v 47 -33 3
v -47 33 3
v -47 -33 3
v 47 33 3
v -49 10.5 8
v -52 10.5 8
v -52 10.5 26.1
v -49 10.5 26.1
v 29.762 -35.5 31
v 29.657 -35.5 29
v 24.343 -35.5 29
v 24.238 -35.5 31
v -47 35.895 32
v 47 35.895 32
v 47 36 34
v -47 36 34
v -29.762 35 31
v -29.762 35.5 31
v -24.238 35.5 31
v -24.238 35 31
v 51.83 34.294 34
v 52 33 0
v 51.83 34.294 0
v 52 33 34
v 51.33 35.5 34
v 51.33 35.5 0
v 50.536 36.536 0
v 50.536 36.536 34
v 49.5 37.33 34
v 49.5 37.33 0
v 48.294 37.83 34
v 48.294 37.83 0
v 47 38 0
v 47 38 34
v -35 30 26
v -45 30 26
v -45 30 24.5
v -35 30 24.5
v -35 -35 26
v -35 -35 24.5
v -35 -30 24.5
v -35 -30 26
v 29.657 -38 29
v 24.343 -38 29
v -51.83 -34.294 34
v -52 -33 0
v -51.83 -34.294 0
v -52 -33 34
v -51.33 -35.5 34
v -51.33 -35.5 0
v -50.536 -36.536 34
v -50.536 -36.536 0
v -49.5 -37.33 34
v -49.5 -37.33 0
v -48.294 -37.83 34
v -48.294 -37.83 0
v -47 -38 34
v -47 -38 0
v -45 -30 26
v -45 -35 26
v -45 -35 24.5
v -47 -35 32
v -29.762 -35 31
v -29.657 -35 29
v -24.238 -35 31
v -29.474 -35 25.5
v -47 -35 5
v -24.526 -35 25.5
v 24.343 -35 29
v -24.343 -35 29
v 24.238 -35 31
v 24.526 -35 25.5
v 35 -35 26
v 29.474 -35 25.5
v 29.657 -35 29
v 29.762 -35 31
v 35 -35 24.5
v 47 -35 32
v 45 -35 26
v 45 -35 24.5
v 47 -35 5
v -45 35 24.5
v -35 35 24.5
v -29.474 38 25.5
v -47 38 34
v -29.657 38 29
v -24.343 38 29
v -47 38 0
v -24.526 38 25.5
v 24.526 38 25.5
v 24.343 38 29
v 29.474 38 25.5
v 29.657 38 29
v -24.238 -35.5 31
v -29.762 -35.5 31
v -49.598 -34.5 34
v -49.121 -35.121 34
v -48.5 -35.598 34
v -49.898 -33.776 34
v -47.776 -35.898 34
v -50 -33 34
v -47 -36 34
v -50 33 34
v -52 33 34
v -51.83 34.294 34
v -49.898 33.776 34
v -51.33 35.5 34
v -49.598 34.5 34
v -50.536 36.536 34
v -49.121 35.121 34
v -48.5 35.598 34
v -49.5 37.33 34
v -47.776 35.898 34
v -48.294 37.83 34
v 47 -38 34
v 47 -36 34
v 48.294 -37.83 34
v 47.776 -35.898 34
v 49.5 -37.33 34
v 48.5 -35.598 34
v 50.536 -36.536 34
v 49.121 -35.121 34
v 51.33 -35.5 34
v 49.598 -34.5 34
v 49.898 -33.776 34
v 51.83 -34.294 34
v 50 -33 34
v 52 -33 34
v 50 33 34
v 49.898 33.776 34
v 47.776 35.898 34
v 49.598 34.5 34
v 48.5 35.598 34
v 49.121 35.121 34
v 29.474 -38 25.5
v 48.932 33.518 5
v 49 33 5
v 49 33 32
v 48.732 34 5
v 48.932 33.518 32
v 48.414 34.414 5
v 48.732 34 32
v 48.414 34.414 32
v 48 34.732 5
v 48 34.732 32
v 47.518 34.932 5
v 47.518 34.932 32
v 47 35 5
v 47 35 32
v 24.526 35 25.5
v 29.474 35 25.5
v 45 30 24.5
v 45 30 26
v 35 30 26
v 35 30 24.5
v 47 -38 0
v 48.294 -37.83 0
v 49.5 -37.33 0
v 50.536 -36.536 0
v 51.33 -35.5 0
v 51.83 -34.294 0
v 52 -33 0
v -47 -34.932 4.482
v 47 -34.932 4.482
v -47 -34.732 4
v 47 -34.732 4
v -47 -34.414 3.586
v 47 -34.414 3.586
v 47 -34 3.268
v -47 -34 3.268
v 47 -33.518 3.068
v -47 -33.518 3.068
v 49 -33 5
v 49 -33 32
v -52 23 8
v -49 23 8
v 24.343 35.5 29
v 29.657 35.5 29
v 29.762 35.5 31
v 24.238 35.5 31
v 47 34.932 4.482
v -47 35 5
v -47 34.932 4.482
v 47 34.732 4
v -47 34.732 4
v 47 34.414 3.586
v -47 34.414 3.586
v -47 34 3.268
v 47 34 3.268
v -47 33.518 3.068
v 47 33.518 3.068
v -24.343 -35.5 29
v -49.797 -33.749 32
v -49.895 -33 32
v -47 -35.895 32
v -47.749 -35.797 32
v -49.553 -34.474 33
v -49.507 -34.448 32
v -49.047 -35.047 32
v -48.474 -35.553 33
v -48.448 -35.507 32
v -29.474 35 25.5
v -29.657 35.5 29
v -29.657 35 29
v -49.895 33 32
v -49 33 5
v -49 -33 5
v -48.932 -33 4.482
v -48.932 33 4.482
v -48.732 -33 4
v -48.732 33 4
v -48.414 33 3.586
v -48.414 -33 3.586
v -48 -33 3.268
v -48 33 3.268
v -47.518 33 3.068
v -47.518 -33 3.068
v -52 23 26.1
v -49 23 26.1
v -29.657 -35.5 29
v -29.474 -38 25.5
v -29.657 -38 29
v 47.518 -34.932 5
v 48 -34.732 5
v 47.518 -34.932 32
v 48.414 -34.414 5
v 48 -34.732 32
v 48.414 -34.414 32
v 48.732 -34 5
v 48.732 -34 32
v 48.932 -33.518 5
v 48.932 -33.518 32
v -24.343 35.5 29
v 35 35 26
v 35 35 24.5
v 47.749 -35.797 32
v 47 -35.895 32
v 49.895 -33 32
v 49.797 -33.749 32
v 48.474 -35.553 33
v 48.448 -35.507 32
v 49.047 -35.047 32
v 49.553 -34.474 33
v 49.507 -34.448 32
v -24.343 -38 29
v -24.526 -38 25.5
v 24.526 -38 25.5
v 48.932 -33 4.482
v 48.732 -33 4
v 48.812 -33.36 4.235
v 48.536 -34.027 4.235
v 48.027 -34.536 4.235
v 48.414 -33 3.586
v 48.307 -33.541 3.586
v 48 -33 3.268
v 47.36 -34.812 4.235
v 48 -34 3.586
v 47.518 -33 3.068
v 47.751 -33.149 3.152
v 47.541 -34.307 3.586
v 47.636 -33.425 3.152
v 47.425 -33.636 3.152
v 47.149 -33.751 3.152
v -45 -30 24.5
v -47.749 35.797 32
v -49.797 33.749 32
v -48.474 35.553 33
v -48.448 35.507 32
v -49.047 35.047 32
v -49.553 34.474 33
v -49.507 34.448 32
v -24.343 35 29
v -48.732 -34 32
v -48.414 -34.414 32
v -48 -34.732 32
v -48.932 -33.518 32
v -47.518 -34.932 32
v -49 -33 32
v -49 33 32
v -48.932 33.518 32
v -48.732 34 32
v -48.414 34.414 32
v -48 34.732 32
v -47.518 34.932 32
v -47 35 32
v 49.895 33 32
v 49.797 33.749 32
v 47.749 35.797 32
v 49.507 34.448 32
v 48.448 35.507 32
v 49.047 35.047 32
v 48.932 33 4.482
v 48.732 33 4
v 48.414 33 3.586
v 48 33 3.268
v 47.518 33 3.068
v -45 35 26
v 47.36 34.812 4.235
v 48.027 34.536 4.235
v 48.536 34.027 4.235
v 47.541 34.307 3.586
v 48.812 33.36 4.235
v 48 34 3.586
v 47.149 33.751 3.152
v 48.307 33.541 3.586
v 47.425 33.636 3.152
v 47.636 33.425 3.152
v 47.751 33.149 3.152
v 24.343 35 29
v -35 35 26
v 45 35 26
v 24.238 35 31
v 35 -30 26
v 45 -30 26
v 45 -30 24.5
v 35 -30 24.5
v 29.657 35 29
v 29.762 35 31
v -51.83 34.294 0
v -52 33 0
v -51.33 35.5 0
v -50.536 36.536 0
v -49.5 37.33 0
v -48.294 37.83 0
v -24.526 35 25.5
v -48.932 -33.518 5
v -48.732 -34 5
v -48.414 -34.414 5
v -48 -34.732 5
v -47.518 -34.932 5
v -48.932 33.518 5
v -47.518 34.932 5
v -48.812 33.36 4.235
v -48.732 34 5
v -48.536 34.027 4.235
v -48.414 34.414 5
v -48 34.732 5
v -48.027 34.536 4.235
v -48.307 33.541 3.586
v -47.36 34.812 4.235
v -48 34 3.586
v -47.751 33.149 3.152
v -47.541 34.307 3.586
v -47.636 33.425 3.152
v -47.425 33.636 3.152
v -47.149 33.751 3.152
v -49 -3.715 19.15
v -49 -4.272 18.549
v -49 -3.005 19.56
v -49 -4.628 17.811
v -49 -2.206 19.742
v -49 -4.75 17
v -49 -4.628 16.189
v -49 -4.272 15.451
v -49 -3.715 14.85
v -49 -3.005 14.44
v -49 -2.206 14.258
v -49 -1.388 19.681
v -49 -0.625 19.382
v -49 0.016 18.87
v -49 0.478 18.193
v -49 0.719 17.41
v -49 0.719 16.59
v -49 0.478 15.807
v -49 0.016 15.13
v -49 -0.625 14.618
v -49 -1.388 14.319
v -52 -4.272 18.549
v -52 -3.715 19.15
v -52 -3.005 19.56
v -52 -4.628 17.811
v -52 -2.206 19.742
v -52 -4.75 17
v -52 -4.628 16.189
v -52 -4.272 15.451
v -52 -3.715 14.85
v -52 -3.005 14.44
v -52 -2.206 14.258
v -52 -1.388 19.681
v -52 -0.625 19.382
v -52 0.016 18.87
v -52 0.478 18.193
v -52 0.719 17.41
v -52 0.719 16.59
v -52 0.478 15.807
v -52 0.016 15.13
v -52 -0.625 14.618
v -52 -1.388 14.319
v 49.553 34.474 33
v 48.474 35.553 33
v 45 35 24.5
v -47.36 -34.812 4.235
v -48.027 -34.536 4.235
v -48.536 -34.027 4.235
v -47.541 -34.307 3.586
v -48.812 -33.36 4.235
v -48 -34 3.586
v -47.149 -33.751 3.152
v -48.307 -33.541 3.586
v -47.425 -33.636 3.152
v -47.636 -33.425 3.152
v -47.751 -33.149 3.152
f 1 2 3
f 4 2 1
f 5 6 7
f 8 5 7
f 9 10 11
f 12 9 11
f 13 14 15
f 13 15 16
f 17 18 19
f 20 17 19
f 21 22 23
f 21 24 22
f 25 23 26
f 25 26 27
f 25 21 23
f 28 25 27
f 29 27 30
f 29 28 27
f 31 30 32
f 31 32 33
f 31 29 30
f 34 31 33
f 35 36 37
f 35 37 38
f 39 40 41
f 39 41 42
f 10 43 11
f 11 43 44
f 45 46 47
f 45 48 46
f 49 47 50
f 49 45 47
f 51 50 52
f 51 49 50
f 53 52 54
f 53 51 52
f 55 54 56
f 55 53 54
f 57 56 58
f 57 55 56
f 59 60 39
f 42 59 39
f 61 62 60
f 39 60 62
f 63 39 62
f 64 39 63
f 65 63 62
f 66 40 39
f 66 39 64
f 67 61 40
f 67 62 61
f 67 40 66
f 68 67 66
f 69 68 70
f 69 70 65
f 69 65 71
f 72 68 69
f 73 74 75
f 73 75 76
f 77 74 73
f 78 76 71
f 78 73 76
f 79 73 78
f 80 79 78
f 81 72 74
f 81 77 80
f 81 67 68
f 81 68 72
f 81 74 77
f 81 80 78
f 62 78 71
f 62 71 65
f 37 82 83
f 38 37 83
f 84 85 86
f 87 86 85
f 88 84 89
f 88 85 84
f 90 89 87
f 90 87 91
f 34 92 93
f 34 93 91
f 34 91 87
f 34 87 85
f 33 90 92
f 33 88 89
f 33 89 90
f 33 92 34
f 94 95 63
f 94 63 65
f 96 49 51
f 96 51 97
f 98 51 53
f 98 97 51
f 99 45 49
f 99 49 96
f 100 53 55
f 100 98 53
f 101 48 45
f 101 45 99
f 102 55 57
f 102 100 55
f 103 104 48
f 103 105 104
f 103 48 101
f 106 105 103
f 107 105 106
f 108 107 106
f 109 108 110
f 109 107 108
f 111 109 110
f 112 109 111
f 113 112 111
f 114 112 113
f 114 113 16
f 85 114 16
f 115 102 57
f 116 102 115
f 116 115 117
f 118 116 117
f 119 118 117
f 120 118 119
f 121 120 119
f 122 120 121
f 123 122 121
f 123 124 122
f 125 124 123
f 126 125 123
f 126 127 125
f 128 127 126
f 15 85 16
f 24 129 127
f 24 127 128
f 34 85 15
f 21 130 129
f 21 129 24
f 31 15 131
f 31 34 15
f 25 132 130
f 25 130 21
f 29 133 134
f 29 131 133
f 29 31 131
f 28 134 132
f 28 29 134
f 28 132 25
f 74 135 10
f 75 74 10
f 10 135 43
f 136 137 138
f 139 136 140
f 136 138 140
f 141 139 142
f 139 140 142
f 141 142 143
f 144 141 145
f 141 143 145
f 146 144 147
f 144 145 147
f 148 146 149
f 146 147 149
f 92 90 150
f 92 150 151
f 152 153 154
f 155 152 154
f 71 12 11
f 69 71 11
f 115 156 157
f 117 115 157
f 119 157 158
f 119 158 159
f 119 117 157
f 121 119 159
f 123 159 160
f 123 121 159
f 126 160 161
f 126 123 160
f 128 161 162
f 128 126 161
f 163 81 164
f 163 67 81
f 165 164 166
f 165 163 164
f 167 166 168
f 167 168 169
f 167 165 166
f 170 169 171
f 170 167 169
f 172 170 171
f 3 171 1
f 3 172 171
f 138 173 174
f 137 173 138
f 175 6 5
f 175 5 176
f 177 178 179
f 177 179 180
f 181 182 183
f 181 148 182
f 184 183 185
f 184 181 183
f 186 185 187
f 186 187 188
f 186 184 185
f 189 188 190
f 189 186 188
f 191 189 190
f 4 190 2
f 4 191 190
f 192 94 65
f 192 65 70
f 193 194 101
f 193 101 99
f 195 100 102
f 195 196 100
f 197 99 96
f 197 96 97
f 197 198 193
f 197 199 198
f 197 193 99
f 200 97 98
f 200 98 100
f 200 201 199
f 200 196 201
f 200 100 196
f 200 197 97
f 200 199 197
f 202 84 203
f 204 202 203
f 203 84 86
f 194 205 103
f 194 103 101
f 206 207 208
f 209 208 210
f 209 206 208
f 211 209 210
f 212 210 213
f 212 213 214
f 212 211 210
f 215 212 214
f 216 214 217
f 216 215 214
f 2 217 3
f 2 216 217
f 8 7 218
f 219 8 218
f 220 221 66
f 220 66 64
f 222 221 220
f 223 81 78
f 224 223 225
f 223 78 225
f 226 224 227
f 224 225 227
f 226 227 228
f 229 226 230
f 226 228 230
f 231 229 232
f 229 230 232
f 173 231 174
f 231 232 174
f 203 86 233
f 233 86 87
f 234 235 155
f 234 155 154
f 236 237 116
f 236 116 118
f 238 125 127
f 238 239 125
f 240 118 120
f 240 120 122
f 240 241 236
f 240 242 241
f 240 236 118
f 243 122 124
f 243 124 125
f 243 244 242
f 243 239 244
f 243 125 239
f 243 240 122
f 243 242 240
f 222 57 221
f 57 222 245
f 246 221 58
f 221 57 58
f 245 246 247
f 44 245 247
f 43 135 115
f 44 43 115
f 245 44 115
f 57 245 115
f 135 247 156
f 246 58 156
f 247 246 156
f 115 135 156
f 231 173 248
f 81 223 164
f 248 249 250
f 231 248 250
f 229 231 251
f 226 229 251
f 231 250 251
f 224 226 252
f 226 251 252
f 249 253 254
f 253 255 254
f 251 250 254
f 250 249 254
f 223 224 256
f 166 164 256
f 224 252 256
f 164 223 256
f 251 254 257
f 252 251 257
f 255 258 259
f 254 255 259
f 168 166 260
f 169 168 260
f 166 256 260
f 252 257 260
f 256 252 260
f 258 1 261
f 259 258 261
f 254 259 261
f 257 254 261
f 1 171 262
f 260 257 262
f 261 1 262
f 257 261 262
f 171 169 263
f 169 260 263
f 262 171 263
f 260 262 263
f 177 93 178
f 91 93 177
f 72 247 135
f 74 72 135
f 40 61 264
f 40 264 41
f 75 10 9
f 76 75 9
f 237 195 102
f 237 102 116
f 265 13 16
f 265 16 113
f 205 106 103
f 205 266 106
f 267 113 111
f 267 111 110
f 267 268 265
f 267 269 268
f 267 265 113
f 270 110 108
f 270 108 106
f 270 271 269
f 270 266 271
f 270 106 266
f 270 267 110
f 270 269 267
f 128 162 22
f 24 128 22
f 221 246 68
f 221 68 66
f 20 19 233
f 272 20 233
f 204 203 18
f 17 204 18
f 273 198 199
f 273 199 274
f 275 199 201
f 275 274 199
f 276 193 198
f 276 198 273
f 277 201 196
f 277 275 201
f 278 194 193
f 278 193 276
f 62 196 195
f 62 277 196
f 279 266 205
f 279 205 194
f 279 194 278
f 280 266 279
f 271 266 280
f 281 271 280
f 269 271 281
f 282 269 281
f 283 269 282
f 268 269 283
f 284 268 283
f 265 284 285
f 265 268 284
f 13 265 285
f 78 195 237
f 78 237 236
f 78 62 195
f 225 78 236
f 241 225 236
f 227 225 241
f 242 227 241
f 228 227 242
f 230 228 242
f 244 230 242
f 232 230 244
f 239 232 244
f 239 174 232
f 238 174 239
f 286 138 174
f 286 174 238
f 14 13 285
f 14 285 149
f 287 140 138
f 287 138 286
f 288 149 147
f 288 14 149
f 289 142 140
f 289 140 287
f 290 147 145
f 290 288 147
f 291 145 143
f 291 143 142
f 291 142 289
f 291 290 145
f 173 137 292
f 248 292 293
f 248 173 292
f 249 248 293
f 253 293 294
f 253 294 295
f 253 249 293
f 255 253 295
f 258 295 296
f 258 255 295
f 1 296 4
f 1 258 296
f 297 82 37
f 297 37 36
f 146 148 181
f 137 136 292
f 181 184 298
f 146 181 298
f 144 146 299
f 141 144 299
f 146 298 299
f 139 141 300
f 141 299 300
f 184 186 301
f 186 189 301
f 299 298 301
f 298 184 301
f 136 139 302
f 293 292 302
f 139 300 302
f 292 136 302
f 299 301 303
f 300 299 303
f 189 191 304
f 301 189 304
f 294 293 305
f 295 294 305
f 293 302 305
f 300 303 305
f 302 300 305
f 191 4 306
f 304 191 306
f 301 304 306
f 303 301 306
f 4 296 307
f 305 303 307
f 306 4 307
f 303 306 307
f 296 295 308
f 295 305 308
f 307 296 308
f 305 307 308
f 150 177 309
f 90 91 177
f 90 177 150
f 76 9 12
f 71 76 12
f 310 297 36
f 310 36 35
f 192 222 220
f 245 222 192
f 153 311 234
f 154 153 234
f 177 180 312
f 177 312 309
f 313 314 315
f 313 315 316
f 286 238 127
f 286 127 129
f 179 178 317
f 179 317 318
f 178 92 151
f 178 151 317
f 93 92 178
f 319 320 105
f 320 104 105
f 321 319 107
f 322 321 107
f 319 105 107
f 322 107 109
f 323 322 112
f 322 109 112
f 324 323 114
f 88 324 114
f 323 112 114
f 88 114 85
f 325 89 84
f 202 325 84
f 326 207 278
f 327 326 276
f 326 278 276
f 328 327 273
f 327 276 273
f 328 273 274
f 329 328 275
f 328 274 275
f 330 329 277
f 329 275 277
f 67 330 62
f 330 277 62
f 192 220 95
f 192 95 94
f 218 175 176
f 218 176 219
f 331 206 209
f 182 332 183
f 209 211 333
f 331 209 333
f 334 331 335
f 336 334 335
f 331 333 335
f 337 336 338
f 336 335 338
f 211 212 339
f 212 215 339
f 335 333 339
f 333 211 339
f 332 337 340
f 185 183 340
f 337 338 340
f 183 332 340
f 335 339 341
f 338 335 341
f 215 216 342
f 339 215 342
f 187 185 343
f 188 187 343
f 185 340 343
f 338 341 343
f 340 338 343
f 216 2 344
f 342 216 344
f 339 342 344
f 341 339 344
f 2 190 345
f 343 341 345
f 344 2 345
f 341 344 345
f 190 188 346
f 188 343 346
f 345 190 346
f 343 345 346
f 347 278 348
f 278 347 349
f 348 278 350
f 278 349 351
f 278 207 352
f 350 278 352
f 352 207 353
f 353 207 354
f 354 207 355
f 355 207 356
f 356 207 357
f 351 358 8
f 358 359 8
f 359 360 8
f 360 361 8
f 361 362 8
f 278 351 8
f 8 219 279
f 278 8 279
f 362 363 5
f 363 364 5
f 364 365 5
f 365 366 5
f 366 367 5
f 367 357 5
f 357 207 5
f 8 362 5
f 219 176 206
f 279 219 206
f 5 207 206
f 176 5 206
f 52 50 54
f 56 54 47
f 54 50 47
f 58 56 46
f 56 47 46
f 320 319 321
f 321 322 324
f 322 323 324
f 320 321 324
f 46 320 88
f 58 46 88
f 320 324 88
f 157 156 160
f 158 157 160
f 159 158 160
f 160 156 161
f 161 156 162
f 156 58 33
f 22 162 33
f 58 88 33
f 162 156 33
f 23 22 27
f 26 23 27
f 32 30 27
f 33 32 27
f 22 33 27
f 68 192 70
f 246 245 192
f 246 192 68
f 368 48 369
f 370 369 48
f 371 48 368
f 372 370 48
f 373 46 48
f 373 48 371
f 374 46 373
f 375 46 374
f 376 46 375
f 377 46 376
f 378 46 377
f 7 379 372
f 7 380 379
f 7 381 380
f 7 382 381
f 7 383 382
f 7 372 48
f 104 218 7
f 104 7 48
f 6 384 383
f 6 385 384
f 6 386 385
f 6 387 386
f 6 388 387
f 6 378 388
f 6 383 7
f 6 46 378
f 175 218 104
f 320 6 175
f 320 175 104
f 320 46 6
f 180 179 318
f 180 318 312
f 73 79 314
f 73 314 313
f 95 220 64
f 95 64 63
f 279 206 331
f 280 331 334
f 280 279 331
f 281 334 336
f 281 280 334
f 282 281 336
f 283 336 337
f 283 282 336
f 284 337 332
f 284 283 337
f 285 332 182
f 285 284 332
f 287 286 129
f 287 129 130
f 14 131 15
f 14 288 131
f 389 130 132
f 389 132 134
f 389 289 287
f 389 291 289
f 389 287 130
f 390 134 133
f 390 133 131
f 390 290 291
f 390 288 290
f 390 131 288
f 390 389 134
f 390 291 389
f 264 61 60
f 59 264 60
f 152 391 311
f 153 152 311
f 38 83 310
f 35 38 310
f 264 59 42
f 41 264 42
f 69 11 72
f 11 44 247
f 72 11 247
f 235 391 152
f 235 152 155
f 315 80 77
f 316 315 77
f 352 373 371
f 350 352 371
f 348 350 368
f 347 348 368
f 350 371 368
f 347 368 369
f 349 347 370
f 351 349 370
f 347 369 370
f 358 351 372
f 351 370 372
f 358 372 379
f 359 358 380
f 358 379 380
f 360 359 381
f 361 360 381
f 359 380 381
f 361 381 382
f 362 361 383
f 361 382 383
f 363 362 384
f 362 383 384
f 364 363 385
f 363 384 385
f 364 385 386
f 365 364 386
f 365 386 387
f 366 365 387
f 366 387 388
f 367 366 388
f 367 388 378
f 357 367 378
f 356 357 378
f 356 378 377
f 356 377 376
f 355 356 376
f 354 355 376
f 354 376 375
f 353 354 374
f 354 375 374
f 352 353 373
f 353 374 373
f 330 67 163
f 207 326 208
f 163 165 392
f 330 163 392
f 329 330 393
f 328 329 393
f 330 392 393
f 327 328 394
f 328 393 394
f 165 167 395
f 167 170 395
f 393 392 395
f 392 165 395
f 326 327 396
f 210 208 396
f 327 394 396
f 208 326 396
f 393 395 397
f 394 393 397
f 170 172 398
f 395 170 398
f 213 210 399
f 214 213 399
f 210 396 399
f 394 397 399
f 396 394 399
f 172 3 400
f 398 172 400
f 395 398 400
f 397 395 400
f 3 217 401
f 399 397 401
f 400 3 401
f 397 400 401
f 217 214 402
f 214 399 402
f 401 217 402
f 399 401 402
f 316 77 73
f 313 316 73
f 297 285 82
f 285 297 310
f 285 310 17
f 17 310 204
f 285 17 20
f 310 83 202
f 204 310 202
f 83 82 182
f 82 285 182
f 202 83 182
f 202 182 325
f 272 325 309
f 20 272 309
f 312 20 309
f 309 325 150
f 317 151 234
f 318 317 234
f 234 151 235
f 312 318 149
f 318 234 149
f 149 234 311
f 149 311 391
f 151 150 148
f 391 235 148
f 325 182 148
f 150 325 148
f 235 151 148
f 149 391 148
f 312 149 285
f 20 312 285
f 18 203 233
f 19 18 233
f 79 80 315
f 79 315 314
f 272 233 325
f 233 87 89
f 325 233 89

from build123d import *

# Parameters (mm, degrees)
SKETCH1_W                                = 104
SKETCH1_H                                = 76
BOSS_EXTRUDE1_DEPTH                      = 34
FILLET1_R                                = 5
SHELL1_T                                 = -3
FILLET2_R                                = 2
SKETCH2_W                                = 10
SKETCH2_H                                = 1.5
BOSS_EXTRUDE2_DEPTH                      = 5
MIRROR2_COPY_1_SKETCH_W                  = 10
MIRROR2_COPY_1_SKETCH_H                  = 1.5
MIRROR2_COPY_1_DEPTH                     = 5
LIP_GROOVE3_GROOVE_DEPTH                 = 2
LIP_GROOVE3_GROOVE_DRAFT                 = -3
SNAP_START                               = -38
SNAP_GROOVE1_DEPTH                       = 3
SNAP_START_2                             = -35.5
SNAP_GROOVE1_2_DEPTH                     = 0.5
MIRROR4_START                            = -38
MIRROR4_AT_THE_SECOND_PLANE_COPY_1_DEPTH = 3
MIRROR4_START_2                          = -35.5
MIRROR4_AT_THE_SECOND_PLANE_COPY_2_DEPTH = 0.5
MIRROR4_AT_THE_SECOND_PLANE_COPY_3_DEPTH = 0.5
SKETCH4_R                                = 2.75
SKETCH4_W                                = 18.1
SKETCH4_H                                = 12.5
CUT_EXTRUDE1_DEPTH                       = 3


# Read off the part's stored shape, not the designer's step: Lip&Groove3-Groove, Snap Groove1
with BuildPart() as part:
    # Sketch1 → Boss-Extrude1 (new body)
    with BuildSketch(Plane.XY):
        Rectangle(SKETCH1_W, SKETCH1_H)
    extrude(amount=BOSS_EXTRUDE1_DEPTH)

    # Fillet1
    fillet1_edges = [part.edges().sort_by_distance(p)[0] for p in [
        (-52, 38, 17),
        (52, 38, 17),
        (52, -38, 17),
        (-52, -38, 17),
    ]]
    fillet(fillet1_edges, radius=FILLET1_R)

    # Shell1
    shell1_openings = [part.faces().sort_by_distance(p)[0] for p in [
        (0, 0, 34),
    ]]
    offset(amount=SHELL1_T, openings=shell1_openings, kind=Kind.INTERSECTION)

    # Fillet2
    fillet2_edges = [part.edges().sort_by_distance(p)[0] for p in [
        (-49, 0, 3),
        (0, -35, 3),
        (49, 0, 3),
        (0, 35, 3),
        (-48.414213562, 34.414213562, 3),
        (48.414213562, 34.414213562, 3),
        (48.414213562, -34.414213562, 3),
        (-48.414213562, -34.414213562, 3),
    ]]
    fillet(fillet2_edges, radius=FILLET2_R)

    # Sketch2 → Boss-Extrude2 (add)
    with BuildSketch(Plane.XZ.offset(-35)):
        with Locations((-40, 25.25)):
            Rectangle(SKETCH2_W, SKETCH2_H)
    boss_extrude2 = extrude(amount=BOSS_EXTRUDE2_DEPTH)

    # Mirror1: Boss-Extrude2 across plane
    add(boss_extrude2.mirror(Plane(origin=(0, 0, 0), x_dir=(0, 0, 1), z_dir=(1, 0, 0))))

    # Mirror2: Boss-Extrude2 across plane
    add(boss_extrude2.mirror(Plane.ZX))

    # Mirror2 copy 1 sketch → Mirror2 copy 1 (add)
    with BuildSketch(Plane(origin=(0, -35, 0), x_dir=(-1, 0, 0), z_dir=(0, 1, 0))):
        with Locations((-40, 25.25)):
            Rectangle(MIRROR2_COPY_1_SKETCH_W, MIRROR2_COPY_1_SKETCH_H)
    extrude(amount=MIRROR2_COPY_1_DEPTH)


with BuildPart() as lip_groove3_groove_tool:
    # Lip&Groove3-Groove outline → Lip&Groove3-Groove (with draft: the straight prism first)
    with BuildSketch(Plane.XY.offset(32)):
        with BuildLine():
            ThreePointArc((-47, 35.895184441), (-49.047204551, 35.047204551), (-49.895184441, 33))
            Line((-49.895184441, 33), (-49.895184441, -33))
            ThreePointArc((-49.895184441, -33), (-49.047204551, -35.047204551), (-47, -35.895184441))
            Line((-47, -35.895184441), (47, -35.895184441))
            ThreePointArc((47, -35.895184441), (49.047204551, -35.047204551), (49.895184441, -33))
            Line((49.895184441, -33), (49.895184441, 33))
            ThreePointArc((49.895184441, 33), (49.047204551, 35.047204551), (47, 35.895184441))
            Line((47, 35.895184441), (-47, 35.895184441))
        make_face()
        with BuildLine():
            Line((-47, 35), (47, 35))
            ThreePointArc((47, 35), (48.414213562, 34.414213562), (49, 33))
            Line((49, 33), (49, -33))
            ThreePointArc((49, -33), (48.414213562, -34.414213562), (47, -35))
            Line((47, -35), (-47, -35))
            ThreePointArc((-47, -35), (-48.414213562, -34.414213562), (-49, -33))
            Line((-49, -33), (-49, 33))
            ThreePointArc((-49, 33), (-48.414213562, 34.414213562), (-47, 35))
        make_face(mode=Mode.SUBTRACT)
    extrude(amount=LIP_GROOVE3_GROOVE_DEPTH)
    # Lip&Groove3-Groove: the draft: its side faces are tilted about the plane it starts from
    lip_groove3_groove_sides = [lip_groove3_groove_tool.faces().sort_by_distance(p)[0] for p in [
        (-49.047204551, 35.047204551, 33),
        (-49.895184441, 0, 33),
        (-49.047204551, -35.047204551, 33),
        (0, -35.895184441, 33),
        (49.047204551, -35.047204551, 33),
        (49.895184441, 0, 33),
        (49.047204551, 35.047204551, 33),
        (0, 35.895184441, 33),
        (0, 35, 33),
        (48.414213562, 34.414213562, 33),
        (49, 0, 33),
        (48.414213562, -34.414213562, 33),
        (0, -35, 33),
        (-48.414213562, -34.414213562, 33),
        (-49, 0, 33),
        (-48.414213562, 34.414213562, 33),
    ]]
    draft(lip_groove3_groove_sides, Plane.XY.offset(32), LIP_GROOVE3_GROOVE_DRAFT)


with BuildPart() as part_1:
    add(part.part)

    # Lip&Groove3-Groove: cut by lip_groove3_groove_tool
    add(lip_groove3_groove_tool.part, mode=Mode.SUBTRACT)

    # Snap Groove1 outline → Snap Groove1 (cut)
    with BuildSketch(Plane(origin=(0, 0, 0), x_dir=(1, 0, 0), z_dir=(0, 1, 0)).offset(SNAP_START)):
        Polygon((-29.47379611, -25.5), (-29.657223337, -29), (-24.342776662, -29), (-24.52620389, -25.5), align=None)
    snap_groove1 = extrude(amount=SNAP_GROOVE1_DEPTH, mode=Mode.SUBTRACT)

    # Snap Groove1 2 outline → Snap Groove1 2 (cut)
    with BuildSketch(Plane(origin=(0, 0, 0), x_dir=(1, 0, 0), z_dir=(0, 1, 0)).offset(SNAP_START_2)):
        Polygon((-24.342776662, -29), (-29.657223338, -29), (-29.762038896, -31), (-24.237961104, -31), align=None)
    snap_groove1_2 = extrude(amount=SNAP_GROOVE1_2_DEPTH, mode=Mode.SUBTRACT)

    # Mirror4: Snap Groove1, Snap Groove1 2 across plane
    add(snap_groove1.mirror(Plane(origin=(0, 0, 0), x_dir=(0, 0, 1), z_dir=(1, 0, 0))), mode=Mode.SUBTRACT)
    add(snap_groove1_2.mirror(Plane(origin=(0, 0, 0), x_dir=(0, 0, 1), z_dir=(1, 0, 0))), mode=Mode.SUBTRACT)

    # Mirror4 at the second plane: Snap Groove1, Snap Groove1 2 across plane
    add(snap_groove1.mirror(Plane.ZX), mode=Mode.SUBTRACT)
    add(snap_groove1_2.mirror(Plane.ZX), mode=Mode.SUBTRACT)

    # Mirror4 at the second plane copy 1 sketc → Mirror4 at the second plane copy 1 (cut)
    with BuildSketch(Plane(origin=(0, 0, 0), x_dir=(-1, 0, 0), z_dir=(0, -1, 0)).offset(MIRROR4_START)):
        Polygon((-29.47379611, -25.5), (-29.657223337, -29), (-24.342776662, -29), (-24.52620389, -25.5), align=None)
    extrude(amount=MIRROR4_AT_THE_SECOND_PLANE_COPY_1_DEPTH, mode=Mode.SUBTRACT)

    # Mirror4 at the second plane copy 2 sketc → Mirror4 at the second plane copy 2 (cut)
    with BuildSketch(Plane(origin=(0, 0, 0), x_dir=(-1, 0, 0), z_dir=(0, -1, 0)).offset(MIRROR4_START_2)):
        Polygon((-24.342776662, -29), (-29.657223338, -29), (-29.762038896, -31), (-24.237961104, -31), align=None)
    extrude(amount=MIRROR4_AT_THE_SECOND_PLANE_COPY_2_DEPTH, mode=Mode.SUBTRACT)

    # Mirror4 at the second plane copy 3 sketc → Mirror4 at the second plane copy 3 (cut)
    with BuildSketch(Plane.XZ.offset(MIRROR4_START_2)):
        Polygon((-24.342776662, 29), (-29.657223338, 29), (-29.762038896, 31), (-24.237961104, 31), align=None)
    extrude(amount=MIRROR4_AT_THE_SECOND_PLANE_COPY_3_DEPTH, mode=Mode.SUBTRACT)

    # Sketch4 → Cut-Extrude1 (cut)
    with BuildSketch(Plane.ZY.offset(52)):
        with Locations(Location((17, -2, 0), (0, 0, 270))):
            Circle(SKETCH4_R)
        with Locations((17.05, 16.75)):
            Rectangle(SKETCH4_W, SKETCH4_H)
    extrude(amount=-CUT_EXTRUDE1_DEPTH, mode=Mode.SUBTRACT)


solid = part_1.part
